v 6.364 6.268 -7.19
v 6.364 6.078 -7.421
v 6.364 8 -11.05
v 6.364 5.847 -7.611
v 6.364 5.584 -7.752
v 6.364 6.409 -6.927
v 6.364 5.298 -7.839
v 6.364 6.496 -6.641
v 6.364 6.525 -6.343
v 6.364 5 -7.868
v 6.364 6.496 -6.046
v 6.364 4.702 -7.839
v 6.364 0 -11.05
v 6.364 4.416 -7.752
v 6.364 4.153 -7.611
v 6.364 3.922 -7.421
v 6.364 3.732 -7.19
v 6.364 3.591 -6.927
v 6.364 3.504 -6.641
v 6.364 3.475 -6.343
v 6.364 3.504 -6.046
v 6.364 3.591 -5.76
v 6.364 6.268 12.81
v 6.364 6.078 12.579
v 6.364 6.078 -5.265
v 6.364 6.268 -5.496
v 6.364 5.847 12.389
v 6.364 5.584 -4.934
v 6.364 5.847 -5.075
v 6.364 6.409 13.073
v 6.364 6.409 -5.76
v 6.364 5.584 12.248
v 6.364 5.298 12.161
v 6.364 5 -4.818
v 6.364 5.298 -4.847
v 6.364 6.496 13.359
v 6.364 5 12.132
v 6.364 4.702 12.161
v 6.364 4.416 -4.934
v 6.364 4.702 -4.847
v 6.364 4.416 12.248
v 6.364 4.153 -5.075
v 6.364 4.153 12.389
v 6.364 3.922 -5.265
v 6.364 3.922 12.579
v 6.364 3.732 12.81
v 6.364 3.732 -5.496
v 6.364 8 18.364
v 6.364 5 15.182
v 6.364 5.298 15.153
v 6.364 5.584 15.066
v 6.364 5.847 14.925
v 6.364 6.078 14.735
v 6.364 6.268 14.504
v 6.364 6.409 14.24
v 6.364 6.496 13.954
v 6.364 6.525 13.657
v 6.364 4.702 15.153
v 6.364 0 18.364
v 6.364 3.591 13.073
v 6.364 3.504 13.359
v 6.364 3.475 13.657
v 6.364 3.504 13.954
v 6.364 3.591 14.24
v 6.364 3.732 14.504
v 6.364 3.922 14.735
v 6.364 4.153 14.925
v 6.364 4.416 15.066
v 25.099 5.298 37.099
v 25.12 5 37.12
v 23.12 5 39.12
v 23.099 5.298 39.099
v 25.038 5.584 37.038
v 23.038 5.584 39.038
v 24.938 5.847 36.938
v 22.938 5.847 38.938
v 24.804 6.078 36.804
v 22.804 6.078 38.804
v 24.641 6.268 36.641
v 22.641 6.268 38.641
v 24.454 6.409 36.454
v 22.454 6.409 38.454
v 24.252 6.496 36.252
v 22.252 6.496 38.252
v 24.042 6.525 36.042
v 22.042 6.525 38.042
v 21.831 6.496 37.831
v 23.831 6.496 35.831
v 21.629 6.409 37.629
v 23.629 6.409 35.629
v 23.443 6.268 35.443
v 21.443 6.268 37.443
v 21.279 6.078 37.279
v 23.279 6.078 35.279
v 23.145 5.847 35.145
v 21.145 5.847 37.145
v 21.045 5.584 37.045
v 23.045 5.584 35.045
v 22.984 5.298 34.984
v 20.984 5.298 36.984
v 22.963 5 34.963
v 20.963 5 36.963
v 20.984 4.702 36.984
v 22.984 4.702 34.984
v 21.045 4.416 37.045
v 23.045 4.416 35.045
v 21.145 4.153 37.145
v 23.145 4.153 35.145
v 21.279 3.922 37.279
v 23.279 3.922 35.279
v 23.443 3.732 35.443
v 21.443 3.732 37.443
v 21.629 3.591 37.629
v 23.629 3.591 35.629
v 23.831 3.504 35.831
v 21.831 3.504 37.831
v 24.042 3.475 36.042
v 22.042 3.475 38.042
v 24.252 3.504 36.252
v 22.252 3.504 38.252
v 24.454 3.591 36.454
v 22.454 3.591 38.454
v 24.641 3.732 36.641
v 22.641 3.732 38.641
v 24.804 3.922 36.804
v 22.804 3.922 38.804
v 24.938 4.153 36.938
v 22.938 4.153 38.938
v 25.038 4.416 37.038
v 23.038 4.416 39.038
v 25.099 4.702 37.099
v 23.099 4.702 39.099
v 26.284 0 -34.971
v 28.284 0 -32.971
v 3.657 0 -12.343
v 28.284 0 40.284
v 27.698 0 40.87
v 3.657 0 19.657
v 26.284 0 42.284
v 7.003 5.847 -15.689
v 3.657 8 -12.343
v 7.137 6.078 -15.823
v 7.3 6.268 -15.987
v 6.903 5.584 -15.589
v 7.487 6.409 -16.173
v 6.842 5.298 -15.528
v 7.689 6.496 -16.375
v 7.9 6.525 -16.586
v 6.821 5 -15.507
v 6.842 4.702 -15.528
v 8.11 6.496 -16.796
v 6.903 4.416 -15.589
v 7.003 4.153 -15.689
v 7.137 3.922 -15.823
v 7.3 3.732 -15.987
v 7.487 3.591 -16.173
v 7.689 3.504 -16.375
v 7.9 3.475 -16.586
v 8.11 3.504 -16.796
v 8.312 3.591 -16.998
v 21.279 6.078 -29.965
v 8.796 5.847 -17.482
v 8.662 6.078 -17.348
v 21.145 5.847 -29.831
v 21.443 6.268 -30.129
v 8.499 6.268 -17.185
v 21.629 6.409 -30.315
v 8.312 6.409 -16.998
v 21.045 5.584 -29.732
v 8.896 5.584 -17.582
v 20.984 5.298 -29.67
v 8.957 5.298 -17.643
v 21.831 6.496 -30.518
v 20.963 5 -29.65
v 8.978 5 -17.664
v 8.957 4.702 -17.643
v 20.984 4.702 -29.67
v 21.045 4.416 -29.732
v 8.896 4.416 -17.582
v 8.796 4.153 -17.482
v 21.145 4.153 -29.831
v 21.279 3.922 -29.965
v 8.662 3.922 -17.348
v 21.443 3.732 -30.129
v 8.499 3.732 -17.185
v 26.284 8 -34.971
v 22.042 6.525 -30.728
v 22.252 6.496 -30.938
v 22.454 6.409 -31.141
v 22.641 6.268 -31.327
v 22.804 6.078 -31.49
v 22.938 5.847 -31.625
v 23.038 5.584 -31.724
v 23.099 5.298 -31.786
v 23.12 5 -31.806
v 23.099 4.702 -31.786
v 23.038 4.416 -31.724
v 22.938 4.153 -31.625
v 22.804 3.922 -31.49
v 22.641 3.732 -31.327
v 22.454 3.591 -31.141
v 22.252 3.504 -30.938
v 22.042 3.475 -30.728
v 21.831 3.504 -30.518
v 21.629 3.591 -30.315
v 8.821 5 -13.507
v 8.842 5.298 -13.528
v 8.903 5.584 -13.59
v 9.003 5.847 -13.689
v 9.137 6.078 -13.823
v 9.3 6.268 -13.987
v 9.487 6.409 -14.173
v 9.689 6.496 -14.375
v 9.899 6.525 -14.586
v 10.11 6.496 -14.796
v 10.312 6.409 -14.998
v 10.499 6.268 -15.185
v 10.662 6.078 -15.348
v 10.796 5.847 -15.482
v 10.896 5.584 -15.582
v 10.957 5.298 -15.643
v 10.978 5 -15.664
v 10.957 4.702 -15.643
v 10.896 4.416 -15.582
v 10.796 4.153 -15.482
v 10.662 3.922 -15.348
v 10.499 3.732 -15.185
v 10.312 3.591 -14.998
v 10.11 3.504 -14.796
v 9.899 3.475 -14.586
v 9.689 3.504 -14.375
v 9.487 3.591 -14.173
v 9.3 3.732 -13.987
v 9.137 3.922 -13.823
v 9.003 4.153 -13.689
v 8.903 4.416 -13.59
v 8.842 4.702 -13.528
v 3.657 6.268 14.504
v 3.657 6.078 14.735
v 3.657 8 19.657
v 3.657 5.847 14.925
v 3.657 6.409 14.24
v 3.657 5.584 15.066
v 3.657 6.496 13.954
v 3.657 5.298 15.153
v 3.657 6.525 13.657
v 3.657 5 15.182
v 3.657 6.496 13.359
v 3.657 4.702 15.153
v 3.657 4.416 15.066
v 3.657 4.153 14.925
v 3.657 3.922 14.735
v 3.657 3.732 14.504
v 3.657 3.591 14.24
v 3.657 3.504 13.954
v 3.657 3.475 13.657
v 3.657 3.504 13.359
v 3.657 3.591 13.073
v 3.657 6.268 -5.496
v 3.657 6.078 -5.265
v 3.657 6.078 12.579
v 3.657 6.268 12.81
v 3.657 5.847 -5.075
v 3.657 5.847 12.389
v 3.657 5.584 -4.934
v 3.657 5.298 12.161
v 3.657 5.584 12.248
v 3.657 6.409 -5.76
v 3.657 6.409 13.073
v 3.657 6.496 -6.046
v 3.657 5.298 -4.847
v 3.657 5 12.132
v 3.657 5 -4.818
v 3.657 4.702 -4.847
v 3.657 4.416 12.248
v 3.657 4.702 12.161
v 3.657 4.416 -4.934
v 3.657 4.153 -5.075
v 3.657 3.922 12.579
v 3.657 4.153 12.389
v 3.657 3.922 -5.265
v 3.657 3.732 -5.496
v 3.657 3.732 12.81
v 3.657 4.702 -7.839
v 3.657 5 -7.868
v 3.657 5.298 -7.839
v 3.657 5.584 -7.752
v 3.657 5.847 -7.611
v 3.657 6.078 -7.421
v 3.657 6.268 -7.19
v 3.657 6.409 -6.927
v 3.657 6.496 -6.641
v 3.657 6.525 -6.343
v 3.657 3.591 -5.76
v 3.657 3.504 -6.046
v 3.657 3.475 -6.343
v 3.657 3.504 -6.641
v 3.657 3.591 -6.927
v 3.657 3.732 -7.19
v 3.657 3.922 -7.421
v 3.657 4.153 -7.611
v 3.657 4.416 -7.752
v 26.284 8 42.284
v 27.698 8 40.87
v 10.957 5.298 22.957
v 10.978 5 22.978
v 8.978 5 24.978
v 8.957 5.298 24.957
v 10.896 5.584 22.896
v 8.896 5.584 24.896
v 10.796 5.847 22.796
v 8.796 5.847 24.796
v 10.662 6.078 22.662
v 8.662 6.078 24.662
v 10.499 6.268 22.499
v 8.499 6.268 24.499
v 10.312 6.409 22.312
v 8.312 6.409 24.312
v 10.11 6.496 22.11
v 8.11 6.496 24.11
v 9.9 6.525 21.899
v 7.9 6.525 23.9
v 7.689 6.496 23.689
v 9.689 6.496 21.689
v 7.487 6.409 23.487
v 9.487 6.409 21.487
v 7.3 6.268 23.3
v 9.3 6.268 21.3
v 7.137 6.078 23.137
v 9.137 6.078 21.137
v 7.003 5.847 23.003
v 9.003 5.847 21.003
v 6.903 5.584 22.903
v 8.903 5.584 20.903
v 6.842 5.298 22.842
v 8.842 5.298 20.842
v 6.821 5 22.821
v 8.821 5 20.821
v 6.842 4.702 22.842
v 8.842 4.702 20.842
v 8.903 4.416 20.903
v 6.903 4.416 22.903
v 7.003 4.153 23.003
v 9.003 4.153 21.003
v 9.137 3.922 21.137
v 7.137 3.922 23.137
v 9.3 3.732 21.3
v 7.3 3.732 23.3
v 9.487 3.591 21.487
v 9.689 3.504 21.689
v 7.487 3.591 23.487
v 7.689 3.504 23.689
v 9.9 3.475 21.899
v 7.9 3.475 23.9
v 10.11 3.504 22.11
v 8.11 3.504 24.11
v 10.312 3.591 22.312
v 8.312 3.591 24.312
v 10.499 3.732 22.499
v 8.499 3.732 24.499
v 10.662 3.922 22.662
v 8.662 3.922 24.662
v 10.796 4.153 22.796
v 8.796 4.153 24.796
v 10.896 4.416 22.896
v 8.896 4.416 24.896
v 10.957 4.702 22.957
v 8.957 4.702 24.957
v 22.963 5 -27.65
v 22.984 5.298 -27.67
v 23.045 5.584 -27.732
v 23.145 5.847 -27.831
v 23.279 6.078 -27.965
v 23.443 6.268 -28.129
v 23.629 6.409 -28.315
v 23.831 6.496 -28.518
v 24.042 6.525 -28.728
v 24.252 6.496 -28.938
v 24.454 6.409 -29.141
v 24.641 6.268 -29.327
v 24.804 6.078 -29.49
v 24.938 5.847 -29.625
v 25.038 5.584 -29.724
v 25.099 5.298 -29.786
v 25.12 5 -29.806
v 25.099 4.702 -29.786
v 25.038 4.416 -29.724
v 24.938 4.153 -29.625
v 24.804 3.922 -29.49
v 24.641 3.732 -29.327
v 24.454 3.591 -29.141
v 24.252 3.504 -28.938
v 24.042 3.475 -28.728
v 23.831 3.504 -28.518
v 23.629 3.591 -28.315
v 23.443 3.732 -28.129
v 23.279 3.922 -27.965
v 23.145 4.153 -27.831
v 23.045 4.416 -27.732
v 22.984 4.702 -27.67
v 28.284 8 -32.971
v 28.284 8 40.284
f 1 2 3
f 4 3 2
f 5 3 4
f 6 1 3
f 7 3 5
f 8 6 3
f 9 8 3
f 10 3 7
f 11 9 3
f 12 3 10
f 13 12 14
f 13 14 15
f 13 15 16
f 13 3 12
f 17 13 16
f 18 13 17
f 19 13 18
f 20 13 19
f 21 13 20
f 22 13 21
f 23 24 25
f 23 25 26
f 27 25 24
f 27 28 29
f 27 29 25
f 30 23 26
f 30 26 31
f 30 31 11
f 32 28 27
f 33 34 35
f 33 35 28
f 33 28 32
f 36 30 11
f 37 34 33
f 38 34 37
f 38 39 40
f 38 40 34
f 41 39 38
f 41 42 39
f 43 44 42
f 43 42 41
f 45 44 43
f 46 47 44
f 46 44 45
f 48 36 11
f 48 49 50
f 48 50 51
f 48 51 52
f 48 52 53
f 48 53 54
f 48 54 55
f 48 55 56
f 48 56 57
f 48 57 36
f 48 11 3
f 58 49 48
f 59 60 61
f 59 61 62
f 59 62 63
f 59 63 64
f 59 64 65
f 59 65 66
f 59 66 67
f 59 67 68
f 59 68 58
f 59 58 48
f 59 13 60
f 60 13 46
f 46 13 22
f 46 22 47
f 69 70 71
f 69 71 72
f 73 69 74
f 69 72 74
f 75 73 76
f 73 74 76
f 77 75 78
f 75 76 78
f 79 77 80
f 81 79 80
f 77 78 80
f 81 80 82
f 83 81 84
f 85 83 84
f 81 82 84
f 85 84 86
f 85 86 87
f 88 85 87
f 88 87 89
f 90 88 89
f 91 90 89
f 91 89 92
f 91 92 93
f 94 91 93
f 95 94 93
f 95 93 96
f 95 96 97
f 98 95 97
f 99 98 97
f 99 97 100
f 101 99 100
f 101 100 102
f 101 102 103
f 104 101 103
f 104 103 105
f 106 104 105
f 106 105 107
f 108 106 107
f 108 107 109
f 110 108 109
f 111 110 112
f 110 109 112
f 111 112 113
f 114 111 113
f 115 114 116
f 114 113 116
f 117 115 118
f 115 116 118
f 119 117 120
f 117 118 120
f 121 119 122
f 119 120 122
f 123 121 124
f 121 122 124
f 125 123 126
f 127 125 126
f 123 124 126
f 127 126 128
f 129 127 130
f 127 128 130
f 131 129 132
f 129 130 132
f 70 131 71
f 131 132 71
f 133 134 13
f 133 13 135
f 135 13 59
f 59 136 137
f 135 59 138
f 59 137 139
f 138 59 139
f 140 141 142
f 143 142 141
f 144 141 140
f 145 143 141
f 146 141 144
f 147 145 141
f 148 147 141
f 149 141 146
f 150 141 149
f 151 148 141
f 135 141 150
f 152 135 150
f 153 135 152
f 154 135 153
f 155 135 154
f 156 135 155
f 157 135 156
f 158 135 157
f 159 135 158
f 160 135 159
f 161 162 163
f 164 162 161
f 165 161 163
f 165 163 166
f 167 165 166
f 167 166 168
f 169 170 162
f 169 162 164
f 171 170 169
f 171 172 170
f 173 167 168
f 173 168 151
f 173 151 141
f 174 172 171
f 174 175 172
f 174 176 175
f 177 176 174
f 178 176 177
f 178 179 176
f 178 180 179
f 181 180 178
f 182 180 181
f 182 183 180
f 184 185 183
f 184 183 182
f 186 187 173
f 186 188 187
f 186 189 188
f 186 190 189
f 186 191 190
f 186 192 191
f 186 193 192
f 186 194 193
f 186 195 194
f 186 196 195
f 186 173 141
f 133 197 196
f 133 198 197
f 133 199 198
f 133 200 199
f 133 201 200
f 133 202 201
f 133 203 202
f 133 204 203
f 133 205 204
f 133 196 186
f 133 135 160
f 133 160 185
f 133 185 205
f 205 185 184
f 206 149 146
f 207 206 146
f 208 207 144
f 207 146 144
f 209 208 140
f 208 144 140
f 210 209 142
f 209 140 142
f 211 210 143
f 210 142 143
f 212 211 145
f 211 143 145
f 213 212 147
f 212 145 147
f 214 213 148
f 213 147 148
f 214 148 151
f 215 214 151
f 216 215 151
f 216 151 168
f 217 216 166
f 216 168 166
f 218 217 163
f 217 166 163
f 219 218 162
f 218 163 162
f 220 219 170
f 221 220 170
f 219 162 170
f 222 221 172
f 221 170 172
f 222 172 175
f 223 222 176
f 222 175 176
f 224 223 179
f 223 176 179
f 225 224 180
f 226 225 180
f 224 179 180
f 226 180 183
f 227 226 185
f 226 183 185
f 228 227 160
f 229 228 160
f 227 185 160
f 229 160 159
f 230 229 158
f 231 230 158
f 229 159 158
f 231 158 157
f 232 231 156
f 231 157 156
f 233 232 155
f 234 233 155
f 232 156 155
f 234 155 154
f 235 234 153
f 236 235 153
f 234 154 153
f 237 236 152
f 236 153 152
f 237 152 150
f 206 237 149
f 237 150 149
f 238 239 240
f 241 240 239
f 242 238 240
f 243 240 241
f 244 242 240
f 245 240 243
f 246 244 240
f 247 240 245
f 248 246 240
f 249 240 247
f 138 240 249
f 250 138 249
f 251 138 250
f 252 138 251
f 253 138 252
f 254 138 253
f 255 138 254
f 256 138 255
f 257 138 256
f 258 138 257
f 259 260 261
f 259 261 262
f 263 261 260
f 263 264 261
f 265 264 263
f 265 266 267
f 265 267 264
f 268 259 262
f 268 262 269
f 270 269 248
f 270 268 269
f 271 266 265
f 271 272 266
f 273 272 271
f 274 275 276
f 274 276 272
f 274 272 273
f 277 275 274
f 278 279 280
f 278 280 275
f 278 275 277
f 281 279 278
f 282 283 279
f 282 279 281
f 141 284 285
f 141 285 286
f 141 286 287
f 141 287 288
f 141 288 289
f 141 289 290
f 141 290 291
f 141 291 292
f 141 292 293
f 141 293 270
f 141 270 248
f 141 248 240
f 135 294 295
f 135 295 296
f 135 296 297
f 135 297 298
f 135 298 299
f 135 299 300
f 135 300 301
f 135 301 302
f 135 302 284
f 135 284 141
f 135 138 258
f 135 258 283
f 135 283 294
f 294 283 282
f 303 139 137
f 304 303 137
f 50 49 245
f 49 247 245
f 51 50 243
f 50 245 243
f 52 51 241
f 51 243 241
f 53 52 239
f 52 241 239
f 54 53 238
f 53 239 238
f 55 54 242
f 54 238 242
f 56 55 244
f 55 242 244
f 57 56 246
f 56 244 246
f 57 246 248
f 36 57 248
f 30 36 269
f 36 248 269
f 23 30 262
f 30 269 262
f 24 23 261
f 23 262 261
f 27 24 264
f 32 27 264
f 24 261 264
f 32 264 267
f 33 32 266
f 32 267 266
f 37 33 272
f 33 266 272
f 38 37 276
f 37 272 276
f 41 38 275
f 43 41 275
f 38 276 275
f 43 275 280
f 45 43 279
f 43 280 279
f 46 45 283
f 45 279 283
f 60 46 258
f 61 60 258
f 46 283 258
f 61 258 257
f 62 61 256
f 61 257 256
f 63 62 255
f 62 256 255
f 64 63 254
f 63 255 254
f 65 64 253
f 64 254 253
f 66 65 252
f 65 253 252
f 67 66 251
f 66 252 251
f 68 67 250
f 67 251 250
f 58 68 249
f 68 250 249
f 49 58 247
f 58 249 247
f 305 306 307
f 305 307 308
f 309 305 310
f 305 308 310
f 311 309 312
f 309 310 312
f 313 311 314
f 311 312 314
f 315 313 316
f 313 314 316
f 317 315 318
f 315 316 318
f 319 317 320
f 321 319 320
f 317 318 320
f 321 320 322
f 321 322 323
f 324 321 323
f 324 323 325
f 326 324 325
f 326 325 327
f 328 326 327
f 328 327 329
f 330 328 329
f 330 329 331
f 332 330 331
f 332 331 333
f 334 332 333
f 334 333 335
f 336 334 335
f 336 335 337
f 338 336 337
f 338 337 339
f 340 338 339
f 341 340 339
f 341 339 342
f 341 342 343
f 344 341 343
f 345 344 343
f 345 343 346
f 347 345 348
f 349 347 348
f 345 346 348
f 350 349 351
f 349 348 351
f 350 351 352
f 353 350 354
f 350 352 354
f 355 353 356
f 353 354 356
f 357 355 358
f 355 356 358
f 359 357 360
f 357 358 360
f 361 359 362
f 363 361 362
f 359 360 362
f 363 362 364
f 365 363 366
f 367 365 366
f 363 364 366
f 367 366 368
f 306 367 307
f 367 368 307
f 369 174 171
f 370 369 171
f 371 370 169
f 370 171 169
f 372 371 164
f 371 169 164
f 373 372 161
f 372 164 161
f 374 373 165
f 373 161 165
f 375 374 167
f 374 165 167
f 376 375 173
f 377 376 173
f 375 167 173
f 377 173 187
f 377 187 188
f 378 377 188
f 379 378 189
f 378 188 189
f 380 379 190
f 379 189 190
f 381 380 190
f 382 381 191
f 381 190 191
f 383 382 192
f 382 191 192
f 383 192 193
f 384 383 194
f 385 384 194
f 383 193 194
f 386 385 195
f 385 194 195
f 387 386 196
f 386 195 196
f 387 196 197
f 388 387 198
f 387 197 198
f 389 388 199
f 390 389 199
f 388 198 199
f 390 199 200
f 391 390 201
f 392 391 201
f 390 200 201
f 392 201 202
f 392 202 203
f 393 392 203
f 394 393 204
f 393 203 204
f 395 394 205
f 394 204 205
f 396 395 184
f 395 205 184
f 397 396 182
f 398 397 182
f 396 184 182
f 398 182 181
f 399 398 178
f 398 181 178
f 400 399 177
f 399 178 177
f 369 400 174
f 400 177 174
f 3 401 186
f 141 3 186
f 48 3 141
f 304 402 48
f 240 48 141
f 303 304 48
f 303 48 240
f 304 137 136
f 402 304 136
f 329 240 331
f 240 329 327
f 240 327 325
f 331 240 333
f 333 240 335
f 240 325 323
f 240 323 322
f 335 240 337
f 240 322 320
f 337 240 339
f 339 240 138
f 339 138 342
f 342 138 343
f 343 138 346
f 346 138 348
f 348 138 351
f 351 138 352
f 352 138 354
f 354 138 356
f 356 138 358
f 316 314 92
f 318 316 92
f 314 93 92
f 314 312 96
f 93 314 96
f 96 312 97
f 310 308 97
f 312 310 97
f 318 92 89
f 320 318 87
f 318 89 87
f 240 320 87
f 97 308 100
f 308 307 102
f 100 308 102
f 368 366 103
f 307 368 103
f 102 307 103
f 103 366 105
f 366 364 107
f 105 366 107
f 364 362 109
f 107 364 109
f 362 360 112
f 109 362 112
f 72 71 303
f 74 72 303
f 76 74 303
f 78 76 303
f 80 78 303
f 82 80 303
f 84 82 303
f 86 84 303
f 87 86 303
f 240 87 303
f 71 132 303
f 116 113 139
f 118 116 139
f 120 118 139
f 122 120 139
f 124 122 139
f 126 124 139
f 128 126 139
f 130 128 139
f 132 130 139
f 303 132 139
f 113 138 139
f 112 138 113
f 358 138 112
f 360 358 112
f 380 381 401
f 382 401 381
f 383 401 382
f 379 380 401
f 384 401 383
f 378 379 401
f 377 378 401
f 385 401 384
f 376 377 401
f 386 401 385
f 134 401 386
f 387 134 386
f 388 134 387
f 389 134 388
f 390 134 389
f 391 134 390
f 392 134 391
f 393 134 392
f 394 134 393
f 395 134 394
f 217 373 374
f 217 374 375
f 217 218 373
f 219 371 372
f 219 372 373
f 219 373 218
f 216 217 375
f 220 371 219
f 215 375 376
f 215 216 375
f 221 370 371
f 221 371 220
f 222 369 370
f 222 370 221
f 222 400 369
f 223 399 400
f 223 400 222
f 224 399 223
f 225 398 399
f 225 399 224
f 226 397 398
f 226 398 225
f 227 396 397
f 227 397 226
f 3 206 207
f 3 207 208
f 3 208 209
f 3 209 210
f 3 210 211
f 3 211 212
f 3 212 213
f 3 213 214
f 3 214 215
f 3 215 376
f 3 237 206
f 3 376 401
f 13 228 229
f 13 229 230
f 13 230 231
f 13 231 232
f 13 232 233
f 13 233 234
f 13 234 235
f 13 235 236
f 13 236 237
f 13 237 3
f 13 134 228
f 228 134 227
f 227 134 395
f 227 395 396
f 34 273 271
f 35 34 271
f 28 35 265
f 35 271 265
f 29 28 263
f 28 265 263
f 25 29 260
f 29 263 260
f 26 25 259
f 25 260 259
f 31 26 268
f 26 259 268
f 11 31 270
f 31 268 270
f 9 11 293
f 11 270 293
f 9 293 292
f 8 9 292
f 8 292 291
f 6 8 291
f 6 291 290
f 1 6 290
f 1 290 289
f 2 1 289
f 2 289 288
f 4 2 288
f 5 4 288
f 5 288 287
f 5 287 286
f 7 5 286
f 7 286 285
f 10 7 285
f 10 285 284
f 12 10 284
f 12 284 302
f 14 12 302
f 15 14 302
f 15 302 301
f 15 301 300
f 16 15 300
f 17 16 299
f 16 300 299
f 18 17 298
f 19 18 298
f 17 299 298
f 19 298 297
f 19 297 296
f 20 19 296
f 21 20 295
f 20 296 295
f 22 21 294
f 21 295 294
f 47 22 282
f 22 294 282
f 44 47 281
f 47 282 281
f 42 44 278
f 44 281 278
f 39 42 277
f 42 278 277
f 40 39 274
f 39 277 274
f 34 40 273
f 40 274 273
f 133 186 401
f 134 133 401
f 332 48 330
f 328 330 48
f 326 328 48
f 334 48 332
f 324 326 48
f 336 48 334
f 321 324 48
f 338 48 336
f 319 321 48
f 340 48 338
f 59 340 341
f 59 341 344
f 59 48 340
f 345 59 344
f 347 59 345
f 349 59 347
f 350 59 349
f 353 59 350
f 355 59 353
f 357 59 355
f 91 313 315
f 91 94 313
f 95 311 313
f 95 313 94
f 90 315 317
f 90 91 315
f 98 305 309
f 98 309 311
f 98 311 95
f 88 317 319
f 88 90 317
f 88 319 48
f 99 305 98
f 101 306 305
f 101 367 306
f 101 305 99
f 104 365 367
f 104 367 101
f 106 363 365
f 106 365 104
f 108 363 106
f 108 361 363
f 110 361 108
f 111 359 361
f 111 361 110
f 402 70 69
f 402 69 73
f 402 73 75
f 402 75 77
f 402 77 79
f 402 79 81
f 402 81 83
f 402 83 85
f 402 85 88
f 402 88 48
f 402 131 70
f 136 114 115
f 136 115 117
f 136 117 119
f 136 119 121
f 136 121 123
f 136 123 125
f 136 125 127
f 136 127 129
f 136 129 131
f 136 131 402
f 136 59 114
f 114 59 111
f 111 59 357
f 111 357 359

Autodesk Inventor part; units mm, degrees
ref_plane "YZ Plane" through (0, 0, 0) normal (1, 0, 0) x (0, 1, 0)
ref_plane "XZ Plane" through (0, 0, 0) normal (0, 1, 0) x (-1, 0, 0)
ref_plane "XY Plane" through (0, 0, 0) normal (0, 0, 1) x (1, 0, 0)
sketch "Sketch1" plane through (0, 0, 0) normal (0, 1, 0) x (-1, 0, 0)
  line L0 (-6.364, 4.3033) -> (-6.364, 17.3033)
  line L1 (-6.364, 4.3033) -> (-6.364, -8.6967)
  line L2 (-6.364, 17.3033) -> (-6.364, 20.3033)
  line L3 (-3.6569, 19.6569) -> (-26.2843, 42.2843)
  line L4 (-26.2843, 42.2843) -> (-27.6985, 40.8701)
  line L5 (-3.6569, -9.3431) -> (-3.6569, -12.3431)
  line L6 (-3.6569, -12.3431) -> (-26.2843, -34.9706)
  line L7 (-26.2843, -34.9706) -> (-28.2843, -32.9706)
  line L8 (-28.2843, -32.9706) -> (-6.364, -11.0503)
  line L9 (-6.364, -11.0503) -> (-6.364, -8.6967)
  line L10 (-3.6569, 19.6569) -> (-3.6569, -12.3431)
  line L11 (-3.6569, -12.3431) -> (-26.2843, -34.9706)
  line L12 (-28.2843, -32.9706) -> (-26.2843, -34.9706)
  line L13 (-28.2843, -32.9706) -> (-6.364, -11.0503)
  line L14 (-6.364, -11.0503) -> (-6.364, 19.5355)
  line L15 (-27.6985, 40.8701) -> (-26.2843, 42.2843)
  line L16 (-26.2843, 42.2843) -> (-3.6569, 19.6569)
  line L17 (-3.6569, 19.6569) -> (-0.6568, 19.6569) construction
  line L18 (-6.364, 18.3639) -> (-28.2843, 40.2842) construction
  line L19 (-28.2843, 40.2842) -> (-26.2843, 42.2843) construction
  line L20 (-26.2843, 42.2843) -> (-28.2843, 40.2842)
  line L21 (-6.364, 18.3639) -> (-28.2843, 40.2842)
  point P0 (0, 0)
  dimension "d64" = 32
  dimension "d65" = 32
  dimension "d66" = 2
  dimension "d67" = 32
  dimension "d70" = 31
extrude "Extrusion2" add sketch "Sketch1" along normal blind 8
sketch "Sketch9" plane through (3.6569, 0, -12.3431) normal (-1, 0, 0) x (0, 0, 1)
  line L0 (0, 0) -> (0, 8) projected
  line L1 (0, 8) -> (32, 8) projected
  line L2 (0, 8) -> (32, 8)
  line L3 (0, 8) -> (16, 8)
  line L4 (16, 8) -> (32, 8)
  line L5 (16, 8) -> (16, 0)
  line L6 (16, 0) -> (3, 0)
  line L7 (30.707, 0) -> (1.2929, 0) projected
  line L8 (3, 0) -> (6, 0)
  line L9 (6, 0) -> (6, 5)
  line L10 (6, 5) -> (16, 5)
  line L11 (16, 5) -> (26, 5)
  line L12 (26, 5) -> (26, 0)
  circle A0 centre (6, 5) radius 1.525
  circle A1 centre (26, 5) radius 1.525
  point P0 (12.3431, 0)
  dimension "d72" = 16
  dimension "d73" = 13
  dimension "d74" = 3
  dimension "d75" = 5
  dimension "d76" = 10
  dimension "d77" = 3.05
  dimension "d78" = 3.05
extrude "Extrusion7" cut sketch "Sketch9" against normal blind 8 contours A0 L9 L10 | L10 L9 A0 | A1 L12 L11 | L11 L12 A1
sketch "Sketch10" plane through (3.6569, 0, -12.3431) normal (-0.7071, 0, -0.7071) x (-0.7071, 0, 0.7071)
  line L0 (-32, 0) -> (0, 0) projected
  line L1 (-16, 0) -> (-32, 0)
  line L2 (-32, 0) -> (-16, 0)
  line L3 (0, 0) -> (-16, 0)
  line L4 (-16, 0) -> (-29, 0)
  line L5 (-29, 0) -> (-26, 0)
  line L6 (-26, 0) -> (-26, 5)
  line L7 (-26, 5) -> (-16, 5)
  line L8 (-16, 5) -> (-6, 5)
  line L9 (-6, 5) -> (-6, 0)
  circle A0 centre (-26, 5) radius 1.525
  circle A1 centre (-6, 5) radius 1.525
  point P0 (11.3137, 0)
  dimension "d81" = 13
  dimension "d82" = 3
  dimension "d83" = 5
  dimension "d84" = 10
  dimension "d85" = 3.05
  dimension "d86" = 3.05
extrude "Extrusion8" cut sketch "Sketch10" against normal blind 8 contours A0 L7 L6 | L6 L7 A0 | A1 L8 L9 | L9 L8 A1
sketch "Sketch11" plane through (26.2843, 0, 42.2843) normal (-0.7071, 0, 0.7071) x (0.7071, 0, 0.7071)
  line L0 (-32, 0) -> (-32, 8) projected
  line L1 (-32, 0) -> (0, 0) projected
  line L2 (-32, 0) -> (0, 0)
  line L3 (0, 0) -> (-16, 0)
  line L4 (-16, 0) -> (-32, 0)
  line L5 (-16, 0) -> (-29, 0)
  line L6 (0, 0) -> (-31.0001, 0) projected
  line L7 (-29, 0) -> (-26, 0)
  line L8 (-26, 0) -> (-26, 5)
  line L9 (-26, 5) -> (-16, 5)
  line L10 (-16, 5) -> (-6, 5)
  line L11 (-6, 5) -> (-6, 0)
  circle A0 centre (-26, 5) radius 1.525
  circle A1 centre (-6, 5) radius 1.525
  point P0 (-48.4853, 0)
  dimension "d89" = 16
  dimension "d90" = 13
  dimension "d91" = 3
  dimension "d92" = 5
  dimension "d93" = 10
  dimension "d94" = 3.05
  dimension "d95" = 3.05
extrude "Extrusion9" cut sketch "Sketch11" against normal blind 8 contours A0 L9 L8 | L8 L9 A0 | A1 L10 L11 | L11 L10 A1
sketch "Sketch12" plane through (0, 0, 0) normal (0, -1, 0) x (1, 0, 0)
  line L0 (3.6569, -12.3431) -> (3.6569, 19.6569) projected
  line L1 (3.6569, -12.3431) -> (3.6569, 19.6569)
  line L2 (3.6569, 19.6569) -> (3.6569, 3.6569)
  line L3 (3.6569, 3.6569) -> (6.364, 3.6568)
  line L4 (6.364, 18.3639) -> (6.364, -11.0503) projected
  point P0 (0, 0)
  dimension "d98" = 16
properties part number "distanceSensorMount"
